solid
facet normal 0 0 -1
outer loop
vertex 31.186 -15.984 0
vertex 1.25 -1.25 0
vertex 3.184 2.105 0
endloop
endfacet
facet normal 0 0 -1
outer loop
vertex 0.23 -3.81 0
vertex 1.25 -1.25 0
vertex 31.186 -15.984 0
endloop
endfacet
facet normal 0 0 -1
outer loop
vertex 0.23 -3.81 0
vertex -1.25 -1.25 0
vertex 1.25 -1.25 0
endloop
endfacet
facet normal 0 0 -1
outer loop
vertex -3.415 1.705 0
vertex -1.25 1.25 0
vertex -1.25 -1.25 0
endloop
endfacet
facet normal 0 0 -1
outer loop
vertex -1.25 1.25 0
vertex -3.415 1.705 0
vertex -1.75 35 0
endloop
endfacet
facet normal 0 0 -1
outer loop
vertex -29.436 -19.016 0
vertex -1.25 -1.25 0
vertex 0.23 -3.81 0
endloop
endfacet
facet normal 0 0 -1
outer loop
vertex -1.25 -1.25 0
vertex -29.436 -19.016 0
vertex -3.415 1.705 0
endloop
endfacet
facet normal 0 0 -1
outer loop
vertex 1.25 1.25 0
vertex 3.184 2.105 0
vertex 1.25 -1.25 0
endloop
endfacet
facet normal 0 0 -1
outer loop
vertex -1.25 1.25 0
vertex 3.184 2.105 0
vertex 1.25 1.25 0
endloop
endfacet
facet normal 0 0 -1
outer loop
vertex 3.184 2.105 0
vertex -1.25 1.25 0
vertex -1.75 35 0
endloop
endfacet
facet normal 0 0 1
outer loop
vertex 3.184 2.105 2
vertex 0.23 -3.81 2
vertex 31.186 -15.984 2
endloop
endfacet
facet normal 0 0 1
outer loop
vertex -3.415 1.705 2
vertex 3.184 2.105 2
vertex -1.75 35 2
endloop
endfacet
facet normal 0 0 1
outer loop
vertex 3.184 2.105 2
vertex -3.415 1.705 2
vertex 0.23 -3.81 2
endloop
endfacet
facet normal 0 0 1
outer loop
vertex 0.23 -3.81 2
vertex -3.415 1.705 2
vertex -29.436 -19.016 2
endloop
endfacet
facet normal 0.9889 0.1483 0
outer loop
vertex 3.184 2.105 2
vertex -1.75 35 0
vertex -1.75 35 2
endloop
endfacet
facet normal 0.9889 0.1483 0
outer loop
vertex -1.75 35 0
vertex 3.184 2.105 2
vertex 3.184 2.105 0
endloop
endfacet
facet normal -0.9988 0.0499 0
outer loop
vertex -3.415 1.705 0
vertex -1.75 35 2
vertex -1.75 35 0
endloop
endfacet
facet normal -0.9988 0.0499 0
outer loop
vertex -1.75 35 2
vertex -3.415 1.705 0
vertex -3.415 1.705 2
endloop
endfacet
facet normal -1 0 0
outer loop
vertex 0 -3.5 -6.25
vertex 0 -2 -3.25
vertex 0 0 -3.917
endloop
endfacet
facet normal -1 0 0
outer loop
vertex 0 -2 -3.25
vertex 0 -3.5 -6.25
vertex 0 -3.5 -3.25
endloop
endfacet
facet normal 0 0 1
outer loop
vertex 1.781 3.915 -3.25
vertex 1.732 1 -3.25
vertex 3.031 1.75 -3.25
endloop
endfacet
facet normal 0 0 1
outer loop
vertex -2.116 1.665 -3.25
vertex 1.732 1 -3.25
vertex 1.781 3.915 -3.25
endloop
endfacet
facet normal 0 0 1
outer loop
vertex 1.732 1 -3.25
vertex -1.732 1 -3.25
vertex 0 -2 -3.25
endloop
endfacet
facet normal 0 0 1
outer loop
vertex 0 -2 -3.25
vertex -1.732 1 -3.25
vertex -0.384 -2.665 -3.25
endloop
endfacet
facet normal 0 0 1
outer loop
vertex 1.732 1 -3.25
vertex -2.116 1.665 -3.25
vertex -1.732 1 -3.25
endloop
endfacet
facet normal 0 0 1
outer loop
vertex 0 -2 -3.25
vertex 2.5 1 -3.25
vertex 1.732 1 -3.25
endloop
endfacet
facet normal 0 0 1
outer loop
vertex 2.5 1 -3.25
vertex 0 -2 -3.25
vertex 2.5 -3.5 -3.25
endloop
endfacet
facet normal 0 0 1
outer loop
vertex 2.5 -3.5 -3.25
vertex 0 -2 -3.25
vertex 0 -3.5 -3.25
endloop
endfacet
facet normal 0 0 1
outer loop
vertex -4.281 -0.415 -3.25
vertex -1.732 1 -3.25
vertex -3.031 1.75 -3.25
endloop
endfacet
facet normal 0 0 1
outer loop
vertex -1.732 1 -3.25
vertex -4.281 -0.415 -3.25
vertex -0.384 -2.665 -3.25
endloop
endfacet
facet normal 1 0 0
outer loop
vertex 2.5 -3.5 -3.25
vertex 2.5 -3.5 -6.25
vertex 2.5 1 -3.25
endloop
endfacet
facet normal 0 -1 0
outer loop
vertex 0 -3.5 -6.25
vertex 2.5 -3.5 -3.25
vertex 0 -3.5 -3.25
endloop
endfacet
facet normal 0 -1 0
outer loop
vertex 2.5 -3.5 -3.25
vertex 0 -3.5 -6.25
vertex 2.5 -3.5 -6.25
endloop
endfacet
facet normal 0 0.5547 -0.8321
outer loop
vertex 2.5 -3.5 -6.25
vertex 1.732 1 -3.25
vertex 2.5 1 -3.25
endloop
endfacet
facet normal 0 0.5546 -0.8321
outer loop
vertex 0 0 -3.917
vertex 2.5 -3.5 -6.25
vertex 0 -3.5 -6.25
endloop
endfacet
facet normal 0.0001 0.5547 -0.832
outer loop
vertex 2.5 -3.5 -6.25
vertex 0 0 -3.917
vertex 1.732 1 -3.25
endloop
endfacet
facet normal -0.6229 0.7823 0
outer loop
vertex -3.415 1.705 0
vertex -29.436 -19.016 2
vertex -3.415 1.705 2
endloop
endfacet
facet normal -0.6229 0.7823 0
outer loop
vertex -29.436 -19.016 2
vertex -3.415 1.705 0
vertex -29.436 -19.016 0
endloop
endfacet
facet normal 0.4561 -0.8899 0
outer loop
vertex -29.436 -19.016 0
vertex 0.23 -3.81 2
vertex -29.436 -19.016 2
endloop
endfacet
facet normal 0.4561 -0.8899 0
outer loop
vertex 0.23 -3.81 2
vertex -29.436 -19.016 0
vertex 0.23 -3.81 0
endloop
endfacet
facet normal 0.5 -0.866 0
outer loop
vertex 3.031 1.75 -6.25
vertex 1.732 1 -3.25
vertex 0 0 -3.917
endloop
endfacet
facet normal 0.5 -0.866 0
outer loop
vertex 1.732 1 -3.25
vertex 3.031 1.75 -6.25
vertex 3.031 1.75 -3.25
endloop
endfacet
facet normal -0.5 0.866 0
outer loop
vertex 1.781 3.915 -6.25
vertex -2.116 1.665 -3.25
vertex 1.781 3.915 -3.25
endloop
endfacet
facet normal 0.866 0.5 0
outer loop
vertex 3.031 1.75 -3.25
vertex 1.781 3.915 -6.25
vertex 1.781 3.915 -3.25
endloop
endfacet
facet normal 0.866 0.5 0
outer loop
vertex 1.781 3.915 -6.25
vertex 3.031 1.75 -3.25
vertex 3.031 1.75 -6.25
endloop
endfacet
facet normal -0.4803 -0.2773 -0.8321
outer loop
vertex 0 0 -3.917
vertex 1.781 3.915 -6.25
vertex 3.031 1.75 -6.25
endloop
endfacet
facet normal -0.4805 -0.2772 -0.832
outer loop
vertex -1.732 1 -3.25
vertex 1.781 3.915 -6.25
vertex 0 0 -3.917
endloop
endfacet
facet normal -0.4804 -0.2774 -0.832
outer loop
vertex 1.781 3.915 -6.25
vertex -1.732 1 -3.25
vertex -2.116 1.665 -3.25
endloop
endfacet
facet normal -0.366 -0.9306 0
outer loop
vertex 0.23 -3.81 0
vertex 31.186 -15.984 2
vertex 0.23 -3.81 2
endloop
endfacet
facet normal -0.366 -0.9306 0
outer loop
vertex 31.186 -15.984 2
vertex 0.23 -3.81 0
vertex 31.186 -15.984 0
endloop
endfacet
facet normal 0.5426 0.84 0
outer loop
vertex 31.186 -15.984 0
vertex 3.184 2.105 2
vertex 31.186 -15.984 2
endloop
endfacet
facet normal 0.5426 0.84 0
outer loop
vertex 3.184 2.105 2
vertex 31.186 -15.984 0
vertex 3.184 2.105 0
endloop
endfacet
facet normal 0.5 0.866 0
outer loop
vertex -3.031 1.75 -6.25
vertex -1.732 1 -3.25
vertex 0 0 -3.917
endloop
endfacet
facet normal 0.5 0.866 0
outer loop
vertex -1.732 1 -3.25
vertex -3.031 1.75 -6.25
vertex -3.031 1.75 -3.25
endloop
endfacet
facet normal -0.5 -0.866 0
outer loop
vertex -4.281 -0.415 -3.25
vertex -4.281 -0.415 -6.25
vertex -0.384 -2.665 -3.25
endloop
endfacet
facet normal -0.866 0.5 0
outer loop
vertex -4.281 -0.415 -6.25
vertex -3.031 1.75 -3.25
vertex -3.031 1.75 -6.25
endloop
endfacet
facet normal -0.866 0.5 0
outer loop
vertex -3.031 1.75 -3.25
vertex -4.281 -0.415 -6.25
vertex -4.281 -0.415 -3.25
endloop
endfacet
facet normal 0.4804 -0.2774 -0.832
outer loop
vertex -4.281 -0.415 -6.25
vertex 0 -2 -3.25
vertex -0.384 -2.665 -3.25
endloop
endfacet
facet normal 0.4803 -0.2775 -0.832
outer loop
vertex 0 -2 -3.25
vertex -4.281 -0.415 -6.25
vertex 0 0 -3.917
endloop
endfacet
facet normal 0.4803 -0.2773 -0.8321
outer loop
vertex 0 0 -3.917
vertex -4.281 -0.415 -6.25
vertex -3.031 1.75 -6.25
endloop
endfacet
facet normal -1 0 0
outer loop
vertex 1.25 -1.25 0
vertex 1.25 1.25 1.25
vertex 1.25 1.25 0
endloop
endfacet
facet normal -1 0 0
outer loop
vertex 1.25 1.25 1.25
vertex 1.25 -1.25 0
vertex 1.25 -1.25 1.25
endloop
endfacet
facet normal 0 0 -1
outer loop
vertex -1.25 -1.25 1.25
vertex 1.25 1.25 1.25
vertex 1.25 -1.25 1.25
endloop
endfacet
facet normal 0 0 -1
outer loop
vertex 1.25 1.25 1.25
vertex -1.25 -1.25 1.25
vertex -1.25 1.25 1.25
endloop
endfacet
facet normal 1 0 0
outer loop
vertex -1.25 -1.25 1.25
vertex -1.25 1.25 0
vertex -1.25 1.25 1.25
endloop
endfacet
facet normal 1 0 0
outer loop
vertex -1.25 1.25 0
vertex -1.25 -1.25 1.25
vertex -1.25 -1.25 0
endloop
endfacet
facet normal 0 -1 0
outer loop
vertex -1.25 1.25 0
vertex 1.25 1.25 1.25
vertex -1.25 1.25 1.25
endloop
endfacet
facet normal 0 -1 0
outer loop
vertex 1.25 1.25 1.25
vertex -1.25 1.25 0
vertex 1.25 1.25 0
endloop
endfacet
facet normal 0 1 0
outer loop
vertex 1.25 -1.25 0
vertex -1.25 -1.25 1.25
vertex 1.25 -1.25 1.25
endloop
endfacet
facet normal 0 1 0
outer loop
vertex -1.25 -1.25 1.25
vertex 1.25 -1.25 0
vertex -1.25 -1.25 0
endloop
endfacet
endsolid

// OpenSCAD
difference() {

    union() {

        rotate(a = [ 0, 0, 120 * 0 ]) {

            linear_extrude(height = 2)
                polygon(points = [
                    [ -3.5, 0 ],
                    [ 3.5, 0 ],
                    [ -1.75, 35 ]
                ]);

            rotate(a = [ 0, 0, -90 ])
                translate(v = [ 0, 0, -1.25 ])
                    rotate(a = [ -90, 0, 0 ])
                        linear_extrude(height = 2.5)
                            polygon(points = [
                                [ 3.5, 2 ],
                                [ -1, 2 ],
                                [ 3.5, 5 ]
                            ]);

        };

        rotate(a = [ 0, 0, 120 * 1 ]) {

            linear_extrude(height = 2)
                polygon(points = [
                    [ -3.5, 0 ],
                    [ 3.5, 0 ],
                    [ -1.75, 35 ]
                ]);

            rotate(a = [ 0, 0, -90 ])
                translate(v = [ 0, 0, -1.25 ])
                    rotate(a = [ -90, 0, 0 ])
                        linear_extrude(height = 2.5)
                            polygon(points = [
                                [ 3.5, 2 ],
                                [ -1, 2 ],
                                [ 3.5, 5 ]
                            ]);

        };


        rotate(a = [ 0, 0, 120 * 2 ]) {

            linear_extrude(height = 2)
                polygon(points = [
                    [ -3.5, 0 ],
                    [ 3.5, 0 ],
                    [ -1.75, 35 ]
                ]);

            rotate(a = [ 0, 0, -90 ])
                translate(v = [ 0, 0, -1.25 ])
                    rotate(a = [ -90, 0, 0 ])
                        linear_extrude(height = 2.5)
                            polygon(points = [
                                [ 3.5, 2 ],
                                [ -1, 2 ],
                                [ 3.5, 5 ]
                            ]);

        };

    };

    cube(2.5, 2.5, 6, center=true);

};
